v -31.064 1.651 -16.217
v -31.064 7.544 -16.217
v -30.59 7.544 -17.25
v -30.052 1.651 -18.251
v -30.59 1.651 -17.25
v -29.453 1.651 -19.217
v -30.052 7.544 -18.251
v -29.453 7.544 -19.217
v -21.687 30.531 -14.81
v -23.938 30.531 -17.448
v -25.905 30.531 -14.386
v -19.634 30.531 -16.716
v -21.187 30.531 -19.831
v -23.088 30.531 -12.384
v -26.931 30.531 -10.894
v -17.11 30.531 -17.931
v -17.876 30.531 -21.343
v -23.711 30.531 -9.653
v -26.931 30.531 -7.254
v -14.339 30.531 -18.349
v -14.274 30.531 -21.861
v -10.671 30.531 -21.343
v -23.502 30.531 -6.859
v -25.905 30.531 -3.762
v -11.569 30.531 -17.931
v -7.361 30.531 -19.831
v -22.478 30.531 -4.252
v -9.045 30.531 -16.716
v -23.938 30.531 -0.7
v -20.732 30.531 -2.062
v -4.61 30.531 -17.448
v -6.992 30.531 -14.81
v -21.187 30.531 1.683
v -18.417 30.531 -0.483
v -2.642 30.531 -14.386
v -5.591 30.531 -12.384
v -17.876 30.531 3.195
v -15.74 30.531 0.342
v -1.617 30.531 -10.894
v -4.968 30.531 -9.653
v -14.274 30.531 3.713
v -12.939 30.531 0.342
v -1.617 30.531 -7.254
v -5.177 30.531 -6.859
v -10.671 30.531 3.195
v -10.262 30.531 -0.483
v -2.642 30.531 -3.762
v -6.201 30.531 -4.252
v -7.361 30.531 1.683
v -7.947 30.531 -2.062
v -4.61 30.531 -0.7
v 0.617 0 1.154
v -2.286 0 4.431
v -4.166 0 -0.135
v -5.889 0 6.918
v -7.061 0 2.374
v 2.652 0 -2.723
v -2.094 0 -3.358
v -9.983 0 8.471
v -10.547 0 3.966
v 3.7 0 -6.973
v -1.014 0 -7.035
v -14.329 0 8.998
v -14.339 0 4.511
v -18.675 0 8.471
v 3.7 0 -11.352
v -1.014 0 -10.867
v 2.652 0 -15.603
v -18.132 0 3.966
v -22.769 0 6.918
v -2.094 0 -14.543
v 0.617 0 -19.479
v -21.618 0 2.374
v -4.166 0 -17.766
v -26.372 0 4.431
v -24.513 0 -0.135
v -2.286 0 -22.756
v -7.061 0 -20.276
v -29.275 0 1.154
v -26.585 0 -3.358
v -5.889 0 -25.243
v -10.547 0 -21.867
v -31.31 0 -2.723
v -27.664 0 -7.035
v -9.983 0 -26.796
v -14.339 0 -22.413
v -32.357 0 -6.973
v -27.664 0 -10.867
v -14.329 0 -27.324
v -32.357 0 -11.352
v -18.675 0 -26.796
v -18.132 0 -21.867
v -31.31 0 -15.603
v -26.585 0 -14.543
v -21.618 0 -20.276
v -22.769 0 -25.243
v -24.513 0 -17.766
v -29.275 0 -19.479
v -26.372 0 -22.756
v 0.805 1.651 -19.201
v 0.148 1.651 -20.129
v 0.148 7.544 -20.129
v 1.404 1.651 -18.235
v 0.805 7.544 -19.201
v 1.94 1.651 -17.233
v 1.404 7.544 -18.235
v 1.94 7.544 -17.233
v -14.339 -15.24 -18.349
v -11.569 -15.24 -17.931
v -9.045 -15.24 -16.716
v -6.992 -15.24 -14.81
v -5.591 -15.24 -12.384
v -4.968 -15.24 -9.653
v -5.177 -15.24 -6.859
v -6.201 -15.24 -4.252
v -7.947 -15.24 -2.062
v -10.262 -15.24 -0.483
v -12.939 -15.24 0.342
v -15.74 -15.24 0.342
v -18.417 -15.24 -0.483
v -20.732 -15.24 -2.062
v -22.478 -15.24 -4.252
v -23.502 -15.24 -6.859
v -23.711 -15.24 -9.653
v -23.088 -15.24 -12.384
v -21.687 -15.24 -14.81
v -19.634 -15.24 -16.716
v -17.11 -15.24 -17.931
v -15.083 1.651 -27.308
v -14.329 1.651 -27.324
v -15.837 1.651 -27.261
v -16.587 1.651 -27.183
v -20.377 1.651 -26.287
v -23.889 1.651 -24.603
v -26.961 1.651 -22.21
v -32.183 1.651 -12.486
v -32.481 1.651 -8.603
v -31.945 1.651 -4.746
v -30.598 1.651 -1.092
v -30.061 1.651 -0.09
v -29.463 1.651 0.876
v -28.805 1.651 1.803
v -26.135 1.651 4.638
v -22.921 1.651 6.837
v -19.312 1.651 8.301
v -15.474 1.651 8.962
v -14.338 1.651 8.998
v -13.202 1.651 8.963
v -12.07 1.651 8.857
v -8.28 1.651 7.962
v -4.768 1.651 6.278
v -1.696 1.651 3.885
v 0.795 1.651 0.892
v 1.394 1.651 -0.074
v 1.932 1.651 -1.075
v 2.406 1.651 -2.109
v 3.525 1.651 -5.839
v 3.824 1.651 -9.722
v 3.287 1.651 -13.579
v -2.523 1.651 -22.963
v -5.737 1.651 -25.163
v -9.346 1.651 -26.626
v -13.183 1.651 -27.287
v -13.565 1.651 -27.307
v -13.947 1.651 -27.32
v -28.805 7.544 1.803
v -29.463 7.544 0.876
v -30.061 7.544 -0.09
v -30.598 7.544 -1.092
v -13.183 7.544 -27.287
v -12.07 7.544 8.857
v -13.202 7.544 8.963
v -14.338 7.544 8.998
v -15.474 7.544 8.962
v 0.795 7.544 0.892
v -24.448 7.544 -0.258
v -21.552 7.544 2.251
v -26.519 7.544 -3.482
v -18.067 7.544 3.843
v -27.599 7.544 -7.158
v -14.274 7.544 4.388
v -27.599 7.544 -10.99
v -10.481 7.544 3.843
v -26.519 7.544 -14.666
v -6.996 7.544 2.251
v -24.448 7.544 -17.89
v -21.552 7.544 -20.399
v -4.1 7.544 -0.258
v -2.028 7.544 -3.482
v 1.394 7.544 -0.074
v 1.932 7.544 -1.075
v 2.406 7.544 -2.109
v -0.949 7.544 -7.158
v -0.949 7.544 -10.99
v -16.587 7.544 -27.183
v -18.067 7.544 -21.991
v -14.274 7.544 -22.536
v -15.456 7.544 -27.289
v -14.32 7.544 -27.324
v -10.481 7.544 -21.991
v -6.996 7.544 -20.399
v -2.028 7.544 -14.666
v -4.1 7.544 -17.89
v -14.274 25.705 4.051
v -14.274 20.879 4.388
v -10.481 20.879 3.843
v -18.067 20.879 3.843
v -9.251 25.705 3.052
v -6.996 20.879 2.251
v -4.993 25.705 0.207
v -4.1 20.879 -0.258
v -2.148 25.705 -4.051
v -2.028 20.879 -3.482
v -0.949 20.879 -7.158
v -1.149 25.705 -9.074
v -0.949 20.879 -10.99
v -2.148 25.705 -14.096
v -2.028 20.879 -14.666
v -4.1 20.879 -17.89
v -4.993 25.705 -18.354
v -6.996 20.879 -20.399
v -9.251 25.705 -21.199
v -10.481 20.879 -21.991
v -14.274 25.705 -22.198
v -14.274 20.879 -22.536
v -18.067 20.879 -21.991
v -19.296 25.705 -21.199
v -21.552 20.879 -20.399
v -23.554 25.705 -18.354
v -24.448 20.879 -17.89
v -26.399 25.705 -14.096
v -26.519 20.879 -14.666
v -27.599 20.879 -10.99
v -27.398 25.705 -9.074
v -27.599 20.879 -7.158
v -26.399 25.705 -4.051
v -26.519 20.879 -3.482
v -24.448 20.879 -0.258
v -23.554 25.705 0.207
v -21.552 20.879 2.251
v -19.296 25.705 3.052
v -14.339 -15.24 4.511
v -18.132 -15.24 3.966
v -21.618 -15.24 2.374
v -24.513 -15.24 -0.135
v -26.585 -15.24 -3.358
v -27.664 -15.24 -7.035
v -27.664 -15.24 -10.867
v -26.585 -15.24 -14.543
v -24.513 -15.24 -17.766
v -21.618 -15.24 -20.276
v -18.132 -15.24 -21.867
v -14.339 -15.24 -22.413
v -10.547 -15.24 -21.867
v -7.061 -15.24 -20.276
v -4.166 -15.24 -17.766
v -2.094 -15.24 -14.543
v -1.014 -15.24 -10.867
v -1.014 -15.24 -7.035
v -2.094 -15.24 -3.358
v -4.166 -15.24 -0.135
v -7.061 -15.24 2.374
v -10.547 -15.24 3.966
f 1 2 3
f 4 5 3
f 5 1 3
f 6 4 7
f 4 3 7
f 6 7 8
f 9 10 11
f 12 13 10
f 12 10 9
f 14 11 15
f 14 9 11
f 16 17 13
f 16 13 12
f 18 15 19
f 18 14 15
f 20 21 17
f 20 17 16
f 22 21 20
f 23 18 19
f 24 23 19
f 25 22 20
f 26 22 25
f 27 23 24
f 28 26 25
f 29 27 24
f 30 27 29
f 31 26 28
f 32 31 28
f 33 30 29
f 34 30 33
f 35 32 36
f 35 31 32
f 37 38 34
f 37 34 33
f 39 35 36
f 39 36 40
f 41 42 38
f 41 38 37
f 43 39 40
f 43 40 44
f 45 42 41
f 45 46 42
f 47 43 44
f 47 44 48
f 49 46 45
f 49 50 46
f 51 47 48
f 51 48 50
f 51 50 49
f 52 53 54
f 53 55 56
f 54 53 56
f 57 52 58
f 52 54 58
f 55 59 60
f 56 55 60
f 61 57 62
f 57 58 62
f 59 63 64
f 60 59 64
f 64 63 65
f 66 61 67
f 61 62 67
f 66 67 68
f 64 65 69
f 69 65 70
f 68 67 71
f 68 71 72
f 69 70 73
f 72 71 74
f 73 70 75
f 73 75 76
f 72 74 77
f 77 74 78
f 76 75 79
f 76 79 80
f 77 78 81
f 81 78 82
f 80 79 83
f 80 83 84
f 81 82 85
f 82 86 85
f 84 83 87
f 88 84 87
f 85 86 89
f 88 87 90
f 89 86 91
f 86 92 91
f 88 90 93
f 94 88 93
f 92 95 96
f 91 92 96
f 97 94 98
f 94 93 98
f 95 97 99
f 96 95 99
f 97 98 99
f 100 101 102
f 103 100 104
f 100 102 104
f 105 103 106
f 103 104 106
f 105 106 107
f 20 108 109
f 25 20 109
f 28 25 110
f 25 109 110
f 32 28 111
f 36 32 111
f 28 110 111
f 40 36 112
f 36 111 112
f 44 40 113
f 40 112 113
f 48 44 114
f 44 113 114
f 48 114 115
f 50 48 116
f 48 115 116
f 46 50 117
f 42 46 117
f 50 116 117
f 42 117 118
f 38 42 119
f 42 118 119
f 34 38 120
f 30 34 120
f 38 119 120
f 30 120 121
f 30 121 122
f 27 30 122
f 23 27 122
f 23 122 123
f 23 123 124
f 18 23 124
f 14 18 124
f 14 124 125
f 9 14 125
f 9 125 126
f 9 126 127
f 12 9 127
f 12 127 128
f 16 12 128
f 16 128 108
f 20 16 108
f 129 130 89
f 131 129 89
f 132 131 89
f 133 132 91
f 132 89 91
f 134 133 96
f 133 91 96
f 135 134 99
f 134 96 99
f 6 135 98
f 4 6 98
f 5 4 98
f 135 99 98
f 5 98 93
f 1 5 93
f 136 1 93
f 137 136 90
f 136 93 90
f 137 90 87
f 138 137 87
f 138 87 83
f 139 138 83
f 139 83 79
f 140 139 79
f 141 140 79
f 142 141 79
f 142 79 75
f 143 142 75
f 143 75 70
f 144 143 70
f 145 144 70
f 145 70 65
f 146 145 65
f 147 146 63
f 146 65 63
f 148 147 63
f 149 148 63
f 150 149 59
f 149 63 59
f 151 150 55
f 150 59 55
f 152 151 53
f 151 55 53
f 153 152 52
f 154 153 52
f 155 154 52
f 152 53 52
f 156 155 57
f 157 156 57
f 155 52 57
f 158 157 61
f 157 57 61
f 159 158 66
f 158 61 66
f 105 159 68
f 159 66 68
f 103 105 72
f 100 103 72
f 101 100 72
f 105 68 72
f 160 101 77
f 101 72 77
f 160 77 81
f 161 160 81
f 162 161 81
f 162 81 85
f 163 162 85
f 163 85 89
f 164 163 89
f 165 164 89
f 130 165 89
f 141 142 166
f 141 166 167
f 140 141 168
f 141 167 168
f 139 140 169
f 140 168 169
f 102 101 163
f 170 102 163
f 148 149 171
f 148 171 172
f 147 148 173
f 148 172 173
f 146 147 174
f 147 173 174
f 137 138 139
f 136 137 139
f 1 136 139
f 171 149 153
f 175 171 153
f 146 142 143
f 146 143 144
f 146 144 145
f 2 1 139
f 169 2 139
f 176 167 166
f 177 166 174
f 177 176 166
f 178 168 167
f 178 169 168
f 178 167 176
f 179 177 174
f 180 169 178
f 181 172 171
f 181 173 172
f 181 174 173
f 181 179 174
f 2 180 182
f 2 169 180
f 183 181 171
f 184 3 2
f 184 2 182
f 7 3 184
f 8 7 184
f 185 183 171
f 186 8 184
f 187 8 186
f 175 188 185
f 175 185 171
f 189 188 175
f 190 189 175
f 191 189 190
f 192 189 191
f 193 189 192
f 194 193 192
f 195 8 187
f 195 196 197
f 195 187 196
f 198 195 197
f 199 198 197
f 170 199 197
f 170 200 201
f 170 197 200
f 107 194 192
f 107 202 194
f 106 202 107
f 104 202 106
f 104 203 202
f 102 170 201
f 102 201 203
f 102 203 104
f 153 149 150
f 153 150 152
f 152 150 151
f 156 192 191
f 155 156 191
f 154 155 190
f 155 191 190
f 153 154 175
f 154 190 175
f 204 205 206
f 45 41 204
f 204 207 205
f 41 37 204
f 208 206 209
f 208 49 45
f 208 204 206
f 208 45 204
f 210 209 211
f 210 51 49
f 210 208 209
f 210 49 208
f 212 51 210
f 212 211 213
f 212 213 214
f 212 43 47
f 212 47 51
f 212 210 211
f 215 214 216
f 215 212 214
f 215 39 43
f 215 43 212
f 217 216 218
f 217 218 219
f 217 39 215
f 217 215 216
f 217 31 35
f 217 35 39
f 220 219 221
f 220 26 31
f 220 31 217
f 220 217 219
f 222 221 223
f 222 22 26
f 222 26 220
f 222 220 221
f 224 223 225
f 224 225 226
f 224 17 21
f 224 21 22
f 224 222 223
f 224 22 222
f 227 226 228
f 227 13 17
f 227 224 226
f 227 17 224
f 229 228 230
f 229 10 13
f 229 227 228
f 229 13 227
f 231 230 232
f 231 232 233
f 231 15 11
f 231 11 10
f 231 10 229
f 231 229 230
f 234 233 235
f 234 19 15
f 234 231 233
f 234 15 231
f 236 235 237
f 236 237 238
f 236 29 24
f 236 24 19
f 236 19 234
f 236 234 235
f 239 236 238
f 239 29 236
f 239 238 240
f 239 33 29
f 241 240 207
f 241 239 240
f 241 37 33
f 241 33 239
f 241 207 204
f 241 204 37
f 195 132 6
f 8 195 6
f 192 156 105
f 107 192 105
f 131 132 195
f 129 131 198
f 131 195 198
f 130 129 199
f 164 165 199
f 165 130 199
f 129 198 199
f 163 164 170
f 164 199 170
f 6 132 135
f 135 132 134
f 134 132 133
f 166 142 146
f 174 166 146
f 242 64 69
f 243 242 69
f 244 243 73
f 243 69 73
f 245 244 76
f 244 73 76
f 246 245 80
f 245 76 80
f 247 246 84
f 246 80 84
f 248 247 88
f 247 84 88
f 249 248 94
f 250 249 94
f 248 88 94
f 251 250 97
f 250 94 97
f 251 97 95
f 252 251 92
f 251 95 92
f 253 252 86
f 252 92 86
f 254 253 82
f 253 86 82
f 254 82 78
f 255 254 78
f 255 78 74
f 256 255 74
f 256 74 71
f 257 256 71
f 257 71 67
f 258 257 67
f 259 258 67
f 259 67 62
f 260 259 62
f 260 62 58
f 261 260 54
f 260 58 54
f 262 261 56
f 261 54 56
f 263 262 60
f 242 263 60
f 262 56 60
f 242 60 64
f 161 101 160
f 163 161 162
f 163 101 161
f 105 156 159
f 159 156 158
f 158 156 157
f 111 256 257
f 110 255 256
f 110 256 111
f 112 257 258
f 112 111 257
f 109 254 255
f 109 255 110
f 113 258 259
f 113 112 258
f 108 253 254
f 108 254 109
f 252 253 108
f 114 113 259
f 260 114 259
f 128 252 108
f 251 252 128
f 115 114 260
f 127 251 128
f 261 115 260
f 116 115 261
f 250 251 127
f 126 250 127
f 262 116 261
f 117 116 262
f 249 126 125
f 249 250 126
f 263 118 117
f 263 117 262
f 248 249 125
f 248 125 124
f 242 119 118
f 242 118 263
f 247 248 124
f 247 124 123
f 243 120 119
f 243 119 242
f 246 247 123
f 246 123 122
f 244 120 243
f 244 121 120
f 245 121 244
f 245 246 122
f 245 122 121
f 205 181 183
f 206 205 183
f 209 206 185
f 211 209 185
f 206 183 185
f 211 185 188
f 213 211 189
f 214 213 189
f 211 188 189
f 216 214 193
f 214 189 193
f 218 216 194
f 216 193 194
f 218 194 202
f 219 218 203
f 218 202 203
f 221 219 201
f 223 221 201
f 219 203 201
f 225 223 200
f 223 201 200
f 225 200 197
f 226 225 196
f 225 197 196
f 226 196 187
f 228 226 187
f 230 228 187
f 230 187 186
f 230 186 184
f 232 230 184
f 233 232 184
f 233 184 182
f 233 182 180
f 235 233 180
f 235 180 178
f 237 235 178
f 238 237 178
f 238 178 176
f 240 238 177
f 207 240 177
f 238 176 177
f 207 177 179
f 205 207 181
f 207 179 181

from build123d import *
from build123d.topology import SkipClean

# Parameters (mm, degrees)
SKETCH1_R           = 18.161
BOSS_EXTRUDE1_DEPTH = 1.651
BOSS_EXTRUDE2_DEPTH = 5.8928
CUT_EXTRUDE1_REACH  = 45.689
SKETCH5_R           = 13.462
BOSS_EXTRUDE3_DEPTH = 13.335
SKETCH6_R           = 13.462
BOSS_EXTRUDE4_DEPTH = 9.652
BOSS_EXTRUDE4_TAPER = 4
SKETCH7_R           = 13.462
BOSS_EXTRUDE5_DEPTH = 15.24
SKETCH8_R           = 9.398
CUT_EXTRUDE3_DEPTH  = 63.427016824


with BuildPart() as part:
    # Sketch1 → Boss-Extrude1 (new body)
    with BuildSketch(Plane(origin=(0, 0, 0), x_dir=(1, 0, 0), z_dir=(0, 1, 0))):
        with Locations(Location((-14.328841802, 9.162551515, 0), (0, 0, 90))):
            Circle(SKETCH1_R)
    extrude(amount=BOSS_EXTRUDE1_DEPTH)

    # Sketch2 → Boss-Extrude2 (add)
    with BuildSketch(Plane(origin=(0, 1.651, 0), x_dir=(1, 0, 0), z_dir=(0, 1, 0))):
        Polygon((2.466775283, 0.14327327), (1.879890825, 19.198343461), (-14.91572626, 28.217621706), (-31.124458887, 18.18182976), (-30.537574428, -0.87324043), (-13.741957343, -9.892518675), align=None)
    extrude(amount=BOSS_EXTRUDE2_DEPTH)

    # Sketch3 → Cut-Extrude1 (cut, up to next)
    with BuildSketch(Plane(origin=(0, 7.5438, 0), x_dir=(1, 0, 0), z_dir=(0, 1, 0)), mode=Mode.PRIVATE) as cut_extrude1_sk1:
        with BuildLine():
            Line((-13.183471606, 27.287397669), (-14.91572626, 28.217621706))
            Line((-14.91572626, 28.217621706), (-16.587451234, 27.182557187))
            ThreePointArc((-16.587451234, 27.182557187), (-14.887924337, 27.314943857), (-13.183471606, 27.287397669))
        make_face()
    cut_extrude1_tool1 = extrude(cut_extrude1_sk1.sketch, amount=-CUT_EXTRUDE1_REACH, mode=Mode.PRIVATE) & part.part
    # Sketch3 → Cut-Extrude1 (cut, up to next)
    with BuildSketch(Plane(origin=(0, 7.5438, 0), x_dir=(1, 0, 0), z_dir=(0, 1, 0)), mode=Mode.PRIVATE) as cut_extrude1_sk2:
        with BuildLine():
            Line((1.879890825, 19.198343461), (0.147636171, 20.128567497))
            ThreePointArc((0.147636171, 20.128567497), (1.112049838, 18.722927364), (1.940420505, 17.233054906))
            Line((1.940420505, 17.233054906), (1.879890825, 19.198343461))
        make_face()
    cut_extrude1_tool2 = extrude(cut_extrude1_sk2.sketch, amount=-CUT_EXTRUDE1_REACH, mode=Mode.PRIVATE) & part.part
    # Sketch3 → Cut-Extrude1 (cut, up to next)
    with BuildSketch(Plane(origin=(0, 7.5438, 0), x_dir=(1, 0, 0), z_dir=(0, 1, 0)), mode=Mode.PRIVATE) as cut_extrude1_sk3:
        with BuildLine():
            Line((-31.124458887, 18.18182976), (-31.063929206, 16.216541206))
            ThreePointArc((-31.063929206, 16.216541206), (-30.328815977, 17.754568007), (-29.452733913, 19.216894278))
            Line((-29.452733913, 19.216894278), (-31.124458887, 18.18182976))
        make_face()
    cut_extrude1_tool3 = extrude(cut_extrude1_sk3.sketch, amount=-CUT_EXTRUDE1_REACH, mode=Mode.PRIVATE) & part.part
    # Sketch3 → Cut-Extrude1 (cut, up to next)
    with BuildSketch(Plane(origin=(0, 7.5438, 0), x_dir=(1, 0, 0), z_dir=(0, 1, 0)), mode=Mode.PRIVATE) as cut_extrude1_sk4:
        with BuildLine():
            Line((-30.537574428, -0.87324043), (-28.805319774, -1.803464467))
            ThreePointArc((-28.805319774, -1.803464467), (-29.769733441, -0.397824334), (-30.598104109, 1.092048124))
            Line((-30.598104109, 1.092048124), (-30.537574428, -0.87324043))
        make_face()
    cut_extrude1_tool4 = extrude(cut_extrude1_sk4.sketch, amount=-CUT_EXTRUDE1_REACH, mode=Mode.PRIVATE) & part.part
    # Sketch3 → Cut-Extrude1 (cut, up to next)
    with BuildSketch(Plane(origin=(0, 7.5438, 0), x_dir=(1, 0, 0), z_dir=(0, 1, 0)), mode=Mode.PRIVATE) as cut_extrude1_sk5:
        with BuildLine():
            Line((-13.741957343, -9.892518675), (-12.070232369, -8.857454157))
            ThreePointArc((-12.070232369, -8.857454157), (-13.769759266, -8.989840826), (-15.474211997, -8.962294639))
            Line((-15.474211997, -8.962294639), (-13.741957343, -9.892518675))
        make_face()
    cut_extrude1_tool5 = extrude(cut_extrude1_sk5.sketch, amount=-CUT_EXTRUDE1_REACH, mode=Mode.PRIVATE) & part.part
    # Sketch3 → Cut-Extrude1 (cut, up to next)
    with BuildSketch(Plane(origin=(0, 7.5438, 0), x_dir=(1, 0, 0), z_dir=(0, 1, 0)), mode=Mode.PRIVATE) as cut_extrude1_sk6:
        with BuildLine():
            Line((2.466775283, 0.14327327), (2.406245603, 2.108561825))
            ThreePointArc((2.406245603, 2.108561825), (1.671132373, 0.570535023), (0.79505031, -0.891791248))
            Line((0.79505031, -0.891791248), (2.466775283, 0.14327327))
        make_face()
    cut_extrude1_tool6 = extrude(cut_extrude1_sk6.sketch, amount=-CUT_EXTRUDE1_REACH, mode=Mode.PRIVATE) & part.part
    add(cut_extrude1_tool1.solids().sort_by_distance((-14.896658, 7.5438, -27.598516))[0], mode=Mode.SUBTRACT)
    add(cut_extrude1_tool2.solids().sort_by_distance((1.353263, 7.5438, -18.872277))[0], mode=Mode.SUBTRACT)
    add(cut_extrude1_tool3.solids().sort_by_distance((-30.578763, 7.5438, -17.88879))[0], mode=Mode.SUBTRACT)
    add(cut_extrude1_tool4.solids().sort_by_distance((-30.010947, 7.5438, 0.547174))[0], mode=Mode.SUBTRACT)
    add(cut_extrude1_tool5.solids().sort_by_distance((-13.761025, 7.5438, 9.273413))[0], mode=Mode.SUBTRACT)
    add(cut_extrude1_tool6.solids().sort_by_distance((1.92108, 7.5438, -0.436313))[0], mode=Mode.SUBTRACT)

    # Sketch5 → Boss-Extrude3 (add)
    with SkipClean():  # the faces are left unmerged after this step: merging them gives an invalid solid
        with BuildSketch(Plane(origin=(0, 7.5438, 0), x_dir=(1, 0, 0), z_dir=(0, 1, 0))):
            with Locations(Location((-14.273901773, 9.073818285, 0), (0, 0, 270))):
                Circle(SKETCH5_R)
        extrude(amount=BOSS_EXTRUDE3_DEPTH)

    # Sketch6 → Boss-Extrude4 (add)
    with SkipClean():  # the faces are left unmerged after this step: merging them gives an invalid solid
        with BuildSketch(Plane(origin=(0, 20.8788, 0), x_dir=(1, 0, 0), z_dir=(0, 1, 0))):
            with Locations(Location((-14.273901773, 9.073818285, 0), (0, 0, 270))):
                Circle(SKETCH6_R)
        extrude(amount=BOSS_EXTRUDE4_DEPTH, taper=BOSS_EXTRUDE4_TAPER)

    # Sketch7 → Boss-Extrude5 (add)
    with SkipClean():  # the faces are left unmerged after this step: merging them gives an invalid solid
        with BuildSketch(Plane.XZ):
            with Locations(Location((-14.33942015, -8.950735224, 0), (0, 0, 90))):
                Circle(SKETCH7_R)
        extrude(amount=BOSS_EXTRUDE5_DEPTH)

    # Sketch8 → Cut-Extrude3 (cut, through all)
    with SkipClean():  # the faces are left unmerged after this step: merging them gives an invalid solid
        with BuildSketch(Plane.XZ.offset(15.24)):
            with Locations(Location((-14.33942015, -8.950735224, 0), (0, 0, 270))):
                Circle(SKETCH8_R)
        extrude(amount=-CUT_EXTRUDE3_DEPTH, mode=Mode.SUBTRACT)


solid = part.part
